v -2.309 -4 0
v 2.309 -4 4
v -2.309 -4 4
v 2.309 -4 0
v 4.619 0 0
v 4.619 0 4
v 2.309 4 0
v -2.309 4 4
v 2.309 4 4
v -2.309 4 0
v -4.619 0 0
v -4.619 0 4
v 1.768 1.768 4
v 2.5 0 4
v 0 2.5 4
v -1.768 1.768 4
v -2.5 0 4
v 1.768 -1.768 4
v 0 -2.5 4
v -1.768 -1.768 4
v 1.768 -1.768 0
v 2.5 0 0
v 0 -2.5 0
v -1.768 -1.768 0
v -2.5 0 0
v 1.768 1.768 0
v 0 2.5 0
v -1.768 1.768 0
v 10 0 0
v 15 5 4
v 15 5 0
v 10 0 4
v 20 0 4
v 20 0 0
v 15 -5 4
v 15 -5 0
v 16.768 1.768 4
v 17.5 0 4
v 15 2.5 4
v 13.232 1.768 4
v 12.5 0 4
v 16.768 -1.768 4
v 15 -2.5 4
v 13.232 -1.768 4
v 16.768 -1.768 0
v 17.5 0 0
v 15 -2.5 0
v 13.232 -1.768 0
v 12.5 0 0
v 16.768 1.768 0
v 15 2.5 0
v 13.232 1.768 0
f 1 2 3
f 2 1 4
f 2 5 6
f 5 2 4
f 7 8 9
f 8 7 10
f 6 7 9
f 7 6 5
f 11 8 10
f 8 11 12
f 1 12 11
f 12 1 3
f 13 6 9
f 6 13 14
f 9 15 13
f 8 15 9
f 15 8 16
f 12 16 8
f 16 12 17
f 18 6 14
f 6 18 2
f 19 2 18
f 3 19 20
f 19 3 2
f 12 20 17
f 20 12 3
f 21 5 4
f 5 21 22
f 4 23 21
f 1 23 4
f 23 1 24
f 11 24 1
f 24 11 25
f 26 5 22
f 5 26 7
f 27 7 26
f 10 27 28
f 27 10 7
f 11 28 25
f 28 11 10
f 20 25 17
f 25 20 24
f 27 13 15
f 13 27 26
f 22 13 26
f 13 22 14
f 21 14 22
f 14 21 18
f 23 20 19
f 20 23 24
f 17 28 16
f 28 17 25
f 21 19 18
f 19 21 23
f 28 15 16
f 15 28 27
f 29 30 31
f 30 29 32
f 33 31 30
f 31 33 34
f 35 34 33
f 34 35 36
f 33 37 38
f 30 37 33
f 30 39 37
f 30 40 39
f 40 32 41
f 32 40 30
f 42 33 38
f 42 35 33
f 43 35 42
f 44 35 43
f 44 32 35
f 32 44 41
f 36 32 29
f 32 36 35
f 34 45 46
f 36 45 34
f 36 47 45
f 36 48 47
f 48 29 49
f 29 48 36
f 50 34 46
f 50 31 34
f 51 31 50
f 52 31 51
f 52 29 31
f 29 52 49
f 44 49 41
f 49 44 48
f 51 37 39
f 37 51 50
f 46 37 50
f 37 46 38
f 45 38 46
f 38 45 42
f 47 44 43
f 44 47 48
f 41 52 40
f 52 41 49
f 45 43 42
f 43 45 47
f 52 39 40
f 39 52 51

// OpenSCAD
// Zweck: hex nut M5 – $fn = 6 at the call creates the hexagon, the bore is round.
s = 8;            // Width across flats
m = 4;            // Height
d_hole = 5;
e = s / cos(30);  // Width across corners
echo(eckmass = e);
difference() {
    cylinder(h = m, d = e, $fn = 6);
    translate([0, 0, -1]) cylinder(h = m + 2, d = d_hole);
}
// Washer next to it, square nut ($fn = 4)
translate([15, 0, 0]) difference() {
    cylinder(h = m, r = 5, $fn = 4);
    translate([0, 0, -1]) cylinder(h = m + 2, d = d_hole);
}
